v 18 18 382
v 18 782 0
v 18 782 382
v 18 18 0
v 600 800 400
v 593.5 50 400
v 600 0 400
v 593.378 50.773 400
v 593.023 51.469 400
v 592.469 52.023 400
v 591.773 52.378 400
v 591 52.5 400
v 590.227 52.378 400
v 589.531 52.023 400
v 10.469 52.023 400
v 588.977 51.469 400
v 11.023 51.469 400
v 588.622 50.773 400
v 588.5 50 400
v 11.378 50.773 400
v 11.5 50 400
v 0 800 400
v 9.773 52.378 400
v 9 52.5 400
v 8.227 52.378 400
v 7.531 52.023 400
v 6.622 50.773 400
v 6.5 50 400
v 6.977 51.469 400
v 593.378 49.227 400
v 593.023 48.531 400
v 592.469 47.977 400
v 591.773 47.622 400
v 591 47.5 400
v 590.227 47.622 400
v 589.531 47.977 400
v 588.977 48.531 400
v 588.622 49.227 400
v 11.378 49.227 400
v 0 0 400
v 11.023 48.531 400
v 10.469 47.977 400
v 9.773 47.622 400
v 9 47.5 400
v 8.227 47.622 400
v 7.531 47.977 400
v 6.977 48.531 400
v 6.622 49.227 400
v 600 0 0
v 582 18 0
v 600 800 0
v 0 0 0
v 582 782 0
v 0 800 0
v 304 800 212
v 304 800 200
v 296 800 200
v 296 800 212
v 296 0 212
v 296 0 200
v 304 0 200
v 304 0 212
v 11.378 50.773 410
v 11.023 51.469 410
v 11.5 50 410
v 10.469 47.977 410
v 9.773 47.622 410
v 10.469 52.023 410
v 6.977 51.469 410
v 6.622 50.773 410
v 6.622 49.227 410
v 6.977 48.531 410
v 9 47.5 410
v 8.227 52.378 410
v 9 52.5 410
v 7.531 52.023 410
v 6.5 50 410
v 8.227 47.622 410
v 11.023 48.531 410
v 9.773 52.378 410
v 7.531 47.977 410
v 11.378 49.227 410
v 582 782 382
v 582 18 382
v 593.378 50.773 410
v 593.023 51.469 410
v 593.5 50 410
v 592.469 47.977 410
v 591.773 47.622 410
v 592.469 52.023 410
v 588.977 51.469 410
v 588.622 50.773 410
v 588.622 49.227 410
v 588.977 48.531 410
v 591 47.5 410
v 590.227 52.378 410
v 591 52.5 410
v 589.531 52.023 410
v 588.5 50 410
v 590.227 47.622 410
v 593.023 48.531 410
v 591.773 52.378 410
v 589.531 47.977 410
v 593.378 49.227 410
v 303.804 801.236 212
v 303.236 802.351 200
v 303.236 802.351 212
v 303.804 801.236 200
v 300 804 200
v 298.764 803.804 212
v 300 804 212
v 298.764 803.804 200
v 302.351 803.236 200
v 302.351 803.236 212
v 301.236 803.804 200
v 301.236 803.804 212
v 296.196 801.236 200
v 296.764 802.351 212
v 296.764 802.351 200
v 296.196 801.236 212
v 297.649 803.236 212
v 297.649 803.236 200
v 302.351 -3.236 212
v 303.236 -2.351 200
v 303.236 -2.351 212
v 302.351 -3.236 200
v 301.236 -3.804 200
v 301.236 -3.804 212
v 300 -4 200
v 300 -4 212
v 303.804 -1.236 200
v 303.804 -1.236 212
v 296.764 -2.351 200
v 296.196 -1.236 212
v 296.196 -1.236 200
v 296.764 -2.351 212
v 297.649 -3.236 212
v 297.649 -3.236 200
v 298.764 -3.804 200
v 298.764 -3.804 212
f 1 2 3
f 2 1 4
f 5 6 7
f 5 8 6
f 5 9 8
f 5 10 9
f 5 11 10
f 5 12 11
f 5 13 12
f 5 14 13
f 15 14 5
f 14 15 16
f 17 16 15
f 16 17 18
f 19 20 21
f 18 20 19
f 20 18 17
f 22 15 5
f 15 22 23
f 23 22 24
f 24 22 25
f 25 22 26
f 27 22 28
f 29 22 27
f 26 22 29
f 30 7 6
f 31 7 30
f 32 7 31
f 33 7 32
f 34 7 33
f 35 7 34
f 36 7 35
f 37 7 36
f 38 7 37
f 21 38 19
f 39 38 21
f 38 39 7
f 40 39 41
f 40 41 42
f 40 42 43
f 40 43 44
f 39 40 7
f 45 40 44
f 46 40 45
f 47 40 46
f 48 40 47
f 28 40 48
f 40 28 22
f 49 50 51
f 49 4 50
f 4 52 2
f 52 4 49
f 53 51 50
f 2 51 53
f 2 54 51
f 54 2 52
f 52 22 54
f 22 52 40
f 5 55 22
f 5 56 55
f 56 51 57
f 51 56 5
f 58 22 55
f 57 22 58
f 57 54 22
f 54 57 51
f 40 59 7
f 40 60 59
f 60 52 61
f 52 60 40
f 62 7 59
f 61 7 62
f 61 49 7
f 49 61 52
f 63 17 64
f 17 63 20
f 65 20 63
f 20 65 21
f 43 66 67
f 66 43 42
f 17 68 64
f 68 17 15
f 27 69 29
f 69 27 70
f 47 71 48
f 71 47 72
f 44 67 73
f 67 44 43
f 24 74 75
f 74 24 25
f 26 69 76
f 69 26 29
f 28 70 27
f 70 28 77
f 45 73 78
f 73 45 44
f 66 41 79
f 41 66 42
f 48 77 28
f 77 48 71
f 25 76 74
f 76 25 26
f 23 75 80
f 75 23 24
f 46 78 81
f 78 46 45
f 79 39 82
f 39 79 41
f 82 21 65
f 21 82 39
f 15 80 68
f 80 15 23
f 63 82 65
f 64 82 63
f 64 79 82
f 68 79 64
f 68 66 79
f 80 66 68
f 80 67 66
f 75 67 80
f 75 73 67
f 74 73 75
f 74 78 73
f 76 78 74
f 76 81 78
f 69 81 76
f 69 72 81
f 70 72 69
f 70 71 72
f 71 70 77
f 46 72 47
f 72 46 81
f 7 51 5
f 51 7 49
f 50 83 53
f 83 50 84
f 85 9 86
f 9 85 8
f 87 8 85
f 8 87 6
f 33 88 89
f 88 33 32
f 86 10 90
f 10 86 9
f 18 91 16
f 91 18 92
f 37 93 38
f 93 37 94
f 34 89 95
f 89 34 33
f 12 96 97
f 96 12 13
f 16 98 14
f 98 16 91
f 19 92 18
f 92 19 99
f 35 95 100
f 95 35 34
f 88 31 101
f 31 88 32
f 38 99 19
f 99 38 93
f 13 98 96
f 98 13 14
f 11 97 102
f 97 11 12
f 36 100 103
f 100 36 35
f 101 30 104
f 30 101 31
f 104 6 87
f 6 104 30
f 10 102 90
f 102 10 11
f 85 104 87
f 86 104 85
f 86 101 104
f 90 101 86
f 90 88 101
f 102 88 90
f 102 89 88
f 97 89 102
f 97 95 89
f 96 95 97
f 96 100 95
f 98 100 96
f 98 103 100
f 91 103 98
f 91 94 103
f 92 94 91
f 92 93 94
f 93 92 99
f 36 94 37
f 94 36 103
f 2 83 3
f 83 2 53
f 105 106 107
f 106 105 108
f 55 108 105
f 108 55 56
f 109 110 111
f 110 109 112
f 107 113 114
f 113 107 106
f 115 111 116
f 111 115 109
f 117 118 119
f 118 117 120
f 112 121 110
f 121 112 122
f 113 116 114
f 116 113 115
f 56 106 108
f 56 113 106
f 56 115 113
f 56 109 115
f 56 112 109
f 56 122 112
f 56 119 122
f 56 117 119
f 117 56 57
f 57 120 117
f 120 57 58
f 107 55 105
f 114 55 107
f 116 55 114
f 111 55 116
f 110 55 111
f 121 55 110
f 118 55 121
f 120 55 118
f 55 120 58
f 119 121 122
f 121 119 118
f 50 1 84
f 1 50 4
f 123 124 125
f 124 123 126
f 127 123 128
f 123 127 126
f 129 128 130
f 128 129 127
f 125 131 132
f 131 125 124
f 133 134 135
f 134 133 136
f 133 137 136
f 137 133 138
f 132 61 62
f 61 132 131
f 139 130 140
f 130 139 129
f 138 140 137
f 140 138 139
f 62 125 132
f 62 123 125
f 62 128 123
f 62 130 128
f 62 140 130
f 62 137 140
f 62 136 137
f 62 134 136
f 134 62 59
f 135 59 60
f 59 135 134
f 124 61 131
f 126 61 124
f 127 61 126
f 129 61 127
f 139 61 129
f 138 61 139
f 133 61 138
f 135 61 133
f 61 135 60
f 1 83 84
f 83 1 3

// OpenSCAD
/*
    More complex OpenSCAD script for a cabinet with drilling information.
*/

// Define a list of colors for the panels
colors = [
    "LightBlue",
    "LightGreen",
    "LightCoral",
    "LightSalmon",
    "LightSteelBlue",
    "Khaki"
];

// Define the dimensions of the cabinet
width = 600;
height = 800;
depth = 400;
thickness = 18;

// Module to create a panel
module panel(name, x, y, z, w, h, d, color_index) {
    color(colors[color_index]) {
        translate([x, y, z])
        cube([w, h, d]);
    }
    echo(str("PANEL:", name, ",", w, ",", h, ",", d, ",", x, ",", y, ",", z));
}

// Module to create a drill hole
module drill_hole(x, y, z, diameter, depth, normal) {
    color("red") {
        translate([x, y, z])
        cylinder(h = depth, d = diameter, $fn = 20);
    }
    echo(str("DRILL:", x, ",", y, ",", z, ",", diameter, ",", depth, ",", normal[0], ",", normal[1], ",", normal[2]));
}

// Create the cabinet
// Left panel
panel("Left", 0, 0, 0, thickness, height, depth, 0);
// Drill on the front face
drill_hole(thickness / 2, 50, 0, 5, 10, [0, 0, -1]);
// Drill on the back face
drill_hole(thickness / 2, 50, depth, 5, 10, [0, 0, 1]);

// Right panel
panel("Right", width - thickness, 0, 0, thickness, height, depth, 1);
// Drill on the front face
drill_hole(width - thickness / 2, 50, 0, 5, 10, [0, 0, -1]);
// Drill on the back face
drill_hole(width - thickness / 2, 50, depth, 5, 10, [0, 0, 1]);

// Top panel
panel("Top", thickness, height - thickness, 0, width - 2 * thickness, thickness, depth, 2);
// Drill on the top face
drill_hole(width/2, height, 200, 8, 12, [0, 1, 0]);

// Bottom panel
panel("Bottom", thickness, 0, 0, width - 2 * thickness, thickness, depth, 3);
// Drill on the bottom face
drill_hole(width/2, 0, 200, 8, 12, [0, -1, 0]);

// Back panel
panel("Back", thickness, thickness, depth - thickness, width - 2 * thickness, height - 2 * thickness, thickness, 4);
